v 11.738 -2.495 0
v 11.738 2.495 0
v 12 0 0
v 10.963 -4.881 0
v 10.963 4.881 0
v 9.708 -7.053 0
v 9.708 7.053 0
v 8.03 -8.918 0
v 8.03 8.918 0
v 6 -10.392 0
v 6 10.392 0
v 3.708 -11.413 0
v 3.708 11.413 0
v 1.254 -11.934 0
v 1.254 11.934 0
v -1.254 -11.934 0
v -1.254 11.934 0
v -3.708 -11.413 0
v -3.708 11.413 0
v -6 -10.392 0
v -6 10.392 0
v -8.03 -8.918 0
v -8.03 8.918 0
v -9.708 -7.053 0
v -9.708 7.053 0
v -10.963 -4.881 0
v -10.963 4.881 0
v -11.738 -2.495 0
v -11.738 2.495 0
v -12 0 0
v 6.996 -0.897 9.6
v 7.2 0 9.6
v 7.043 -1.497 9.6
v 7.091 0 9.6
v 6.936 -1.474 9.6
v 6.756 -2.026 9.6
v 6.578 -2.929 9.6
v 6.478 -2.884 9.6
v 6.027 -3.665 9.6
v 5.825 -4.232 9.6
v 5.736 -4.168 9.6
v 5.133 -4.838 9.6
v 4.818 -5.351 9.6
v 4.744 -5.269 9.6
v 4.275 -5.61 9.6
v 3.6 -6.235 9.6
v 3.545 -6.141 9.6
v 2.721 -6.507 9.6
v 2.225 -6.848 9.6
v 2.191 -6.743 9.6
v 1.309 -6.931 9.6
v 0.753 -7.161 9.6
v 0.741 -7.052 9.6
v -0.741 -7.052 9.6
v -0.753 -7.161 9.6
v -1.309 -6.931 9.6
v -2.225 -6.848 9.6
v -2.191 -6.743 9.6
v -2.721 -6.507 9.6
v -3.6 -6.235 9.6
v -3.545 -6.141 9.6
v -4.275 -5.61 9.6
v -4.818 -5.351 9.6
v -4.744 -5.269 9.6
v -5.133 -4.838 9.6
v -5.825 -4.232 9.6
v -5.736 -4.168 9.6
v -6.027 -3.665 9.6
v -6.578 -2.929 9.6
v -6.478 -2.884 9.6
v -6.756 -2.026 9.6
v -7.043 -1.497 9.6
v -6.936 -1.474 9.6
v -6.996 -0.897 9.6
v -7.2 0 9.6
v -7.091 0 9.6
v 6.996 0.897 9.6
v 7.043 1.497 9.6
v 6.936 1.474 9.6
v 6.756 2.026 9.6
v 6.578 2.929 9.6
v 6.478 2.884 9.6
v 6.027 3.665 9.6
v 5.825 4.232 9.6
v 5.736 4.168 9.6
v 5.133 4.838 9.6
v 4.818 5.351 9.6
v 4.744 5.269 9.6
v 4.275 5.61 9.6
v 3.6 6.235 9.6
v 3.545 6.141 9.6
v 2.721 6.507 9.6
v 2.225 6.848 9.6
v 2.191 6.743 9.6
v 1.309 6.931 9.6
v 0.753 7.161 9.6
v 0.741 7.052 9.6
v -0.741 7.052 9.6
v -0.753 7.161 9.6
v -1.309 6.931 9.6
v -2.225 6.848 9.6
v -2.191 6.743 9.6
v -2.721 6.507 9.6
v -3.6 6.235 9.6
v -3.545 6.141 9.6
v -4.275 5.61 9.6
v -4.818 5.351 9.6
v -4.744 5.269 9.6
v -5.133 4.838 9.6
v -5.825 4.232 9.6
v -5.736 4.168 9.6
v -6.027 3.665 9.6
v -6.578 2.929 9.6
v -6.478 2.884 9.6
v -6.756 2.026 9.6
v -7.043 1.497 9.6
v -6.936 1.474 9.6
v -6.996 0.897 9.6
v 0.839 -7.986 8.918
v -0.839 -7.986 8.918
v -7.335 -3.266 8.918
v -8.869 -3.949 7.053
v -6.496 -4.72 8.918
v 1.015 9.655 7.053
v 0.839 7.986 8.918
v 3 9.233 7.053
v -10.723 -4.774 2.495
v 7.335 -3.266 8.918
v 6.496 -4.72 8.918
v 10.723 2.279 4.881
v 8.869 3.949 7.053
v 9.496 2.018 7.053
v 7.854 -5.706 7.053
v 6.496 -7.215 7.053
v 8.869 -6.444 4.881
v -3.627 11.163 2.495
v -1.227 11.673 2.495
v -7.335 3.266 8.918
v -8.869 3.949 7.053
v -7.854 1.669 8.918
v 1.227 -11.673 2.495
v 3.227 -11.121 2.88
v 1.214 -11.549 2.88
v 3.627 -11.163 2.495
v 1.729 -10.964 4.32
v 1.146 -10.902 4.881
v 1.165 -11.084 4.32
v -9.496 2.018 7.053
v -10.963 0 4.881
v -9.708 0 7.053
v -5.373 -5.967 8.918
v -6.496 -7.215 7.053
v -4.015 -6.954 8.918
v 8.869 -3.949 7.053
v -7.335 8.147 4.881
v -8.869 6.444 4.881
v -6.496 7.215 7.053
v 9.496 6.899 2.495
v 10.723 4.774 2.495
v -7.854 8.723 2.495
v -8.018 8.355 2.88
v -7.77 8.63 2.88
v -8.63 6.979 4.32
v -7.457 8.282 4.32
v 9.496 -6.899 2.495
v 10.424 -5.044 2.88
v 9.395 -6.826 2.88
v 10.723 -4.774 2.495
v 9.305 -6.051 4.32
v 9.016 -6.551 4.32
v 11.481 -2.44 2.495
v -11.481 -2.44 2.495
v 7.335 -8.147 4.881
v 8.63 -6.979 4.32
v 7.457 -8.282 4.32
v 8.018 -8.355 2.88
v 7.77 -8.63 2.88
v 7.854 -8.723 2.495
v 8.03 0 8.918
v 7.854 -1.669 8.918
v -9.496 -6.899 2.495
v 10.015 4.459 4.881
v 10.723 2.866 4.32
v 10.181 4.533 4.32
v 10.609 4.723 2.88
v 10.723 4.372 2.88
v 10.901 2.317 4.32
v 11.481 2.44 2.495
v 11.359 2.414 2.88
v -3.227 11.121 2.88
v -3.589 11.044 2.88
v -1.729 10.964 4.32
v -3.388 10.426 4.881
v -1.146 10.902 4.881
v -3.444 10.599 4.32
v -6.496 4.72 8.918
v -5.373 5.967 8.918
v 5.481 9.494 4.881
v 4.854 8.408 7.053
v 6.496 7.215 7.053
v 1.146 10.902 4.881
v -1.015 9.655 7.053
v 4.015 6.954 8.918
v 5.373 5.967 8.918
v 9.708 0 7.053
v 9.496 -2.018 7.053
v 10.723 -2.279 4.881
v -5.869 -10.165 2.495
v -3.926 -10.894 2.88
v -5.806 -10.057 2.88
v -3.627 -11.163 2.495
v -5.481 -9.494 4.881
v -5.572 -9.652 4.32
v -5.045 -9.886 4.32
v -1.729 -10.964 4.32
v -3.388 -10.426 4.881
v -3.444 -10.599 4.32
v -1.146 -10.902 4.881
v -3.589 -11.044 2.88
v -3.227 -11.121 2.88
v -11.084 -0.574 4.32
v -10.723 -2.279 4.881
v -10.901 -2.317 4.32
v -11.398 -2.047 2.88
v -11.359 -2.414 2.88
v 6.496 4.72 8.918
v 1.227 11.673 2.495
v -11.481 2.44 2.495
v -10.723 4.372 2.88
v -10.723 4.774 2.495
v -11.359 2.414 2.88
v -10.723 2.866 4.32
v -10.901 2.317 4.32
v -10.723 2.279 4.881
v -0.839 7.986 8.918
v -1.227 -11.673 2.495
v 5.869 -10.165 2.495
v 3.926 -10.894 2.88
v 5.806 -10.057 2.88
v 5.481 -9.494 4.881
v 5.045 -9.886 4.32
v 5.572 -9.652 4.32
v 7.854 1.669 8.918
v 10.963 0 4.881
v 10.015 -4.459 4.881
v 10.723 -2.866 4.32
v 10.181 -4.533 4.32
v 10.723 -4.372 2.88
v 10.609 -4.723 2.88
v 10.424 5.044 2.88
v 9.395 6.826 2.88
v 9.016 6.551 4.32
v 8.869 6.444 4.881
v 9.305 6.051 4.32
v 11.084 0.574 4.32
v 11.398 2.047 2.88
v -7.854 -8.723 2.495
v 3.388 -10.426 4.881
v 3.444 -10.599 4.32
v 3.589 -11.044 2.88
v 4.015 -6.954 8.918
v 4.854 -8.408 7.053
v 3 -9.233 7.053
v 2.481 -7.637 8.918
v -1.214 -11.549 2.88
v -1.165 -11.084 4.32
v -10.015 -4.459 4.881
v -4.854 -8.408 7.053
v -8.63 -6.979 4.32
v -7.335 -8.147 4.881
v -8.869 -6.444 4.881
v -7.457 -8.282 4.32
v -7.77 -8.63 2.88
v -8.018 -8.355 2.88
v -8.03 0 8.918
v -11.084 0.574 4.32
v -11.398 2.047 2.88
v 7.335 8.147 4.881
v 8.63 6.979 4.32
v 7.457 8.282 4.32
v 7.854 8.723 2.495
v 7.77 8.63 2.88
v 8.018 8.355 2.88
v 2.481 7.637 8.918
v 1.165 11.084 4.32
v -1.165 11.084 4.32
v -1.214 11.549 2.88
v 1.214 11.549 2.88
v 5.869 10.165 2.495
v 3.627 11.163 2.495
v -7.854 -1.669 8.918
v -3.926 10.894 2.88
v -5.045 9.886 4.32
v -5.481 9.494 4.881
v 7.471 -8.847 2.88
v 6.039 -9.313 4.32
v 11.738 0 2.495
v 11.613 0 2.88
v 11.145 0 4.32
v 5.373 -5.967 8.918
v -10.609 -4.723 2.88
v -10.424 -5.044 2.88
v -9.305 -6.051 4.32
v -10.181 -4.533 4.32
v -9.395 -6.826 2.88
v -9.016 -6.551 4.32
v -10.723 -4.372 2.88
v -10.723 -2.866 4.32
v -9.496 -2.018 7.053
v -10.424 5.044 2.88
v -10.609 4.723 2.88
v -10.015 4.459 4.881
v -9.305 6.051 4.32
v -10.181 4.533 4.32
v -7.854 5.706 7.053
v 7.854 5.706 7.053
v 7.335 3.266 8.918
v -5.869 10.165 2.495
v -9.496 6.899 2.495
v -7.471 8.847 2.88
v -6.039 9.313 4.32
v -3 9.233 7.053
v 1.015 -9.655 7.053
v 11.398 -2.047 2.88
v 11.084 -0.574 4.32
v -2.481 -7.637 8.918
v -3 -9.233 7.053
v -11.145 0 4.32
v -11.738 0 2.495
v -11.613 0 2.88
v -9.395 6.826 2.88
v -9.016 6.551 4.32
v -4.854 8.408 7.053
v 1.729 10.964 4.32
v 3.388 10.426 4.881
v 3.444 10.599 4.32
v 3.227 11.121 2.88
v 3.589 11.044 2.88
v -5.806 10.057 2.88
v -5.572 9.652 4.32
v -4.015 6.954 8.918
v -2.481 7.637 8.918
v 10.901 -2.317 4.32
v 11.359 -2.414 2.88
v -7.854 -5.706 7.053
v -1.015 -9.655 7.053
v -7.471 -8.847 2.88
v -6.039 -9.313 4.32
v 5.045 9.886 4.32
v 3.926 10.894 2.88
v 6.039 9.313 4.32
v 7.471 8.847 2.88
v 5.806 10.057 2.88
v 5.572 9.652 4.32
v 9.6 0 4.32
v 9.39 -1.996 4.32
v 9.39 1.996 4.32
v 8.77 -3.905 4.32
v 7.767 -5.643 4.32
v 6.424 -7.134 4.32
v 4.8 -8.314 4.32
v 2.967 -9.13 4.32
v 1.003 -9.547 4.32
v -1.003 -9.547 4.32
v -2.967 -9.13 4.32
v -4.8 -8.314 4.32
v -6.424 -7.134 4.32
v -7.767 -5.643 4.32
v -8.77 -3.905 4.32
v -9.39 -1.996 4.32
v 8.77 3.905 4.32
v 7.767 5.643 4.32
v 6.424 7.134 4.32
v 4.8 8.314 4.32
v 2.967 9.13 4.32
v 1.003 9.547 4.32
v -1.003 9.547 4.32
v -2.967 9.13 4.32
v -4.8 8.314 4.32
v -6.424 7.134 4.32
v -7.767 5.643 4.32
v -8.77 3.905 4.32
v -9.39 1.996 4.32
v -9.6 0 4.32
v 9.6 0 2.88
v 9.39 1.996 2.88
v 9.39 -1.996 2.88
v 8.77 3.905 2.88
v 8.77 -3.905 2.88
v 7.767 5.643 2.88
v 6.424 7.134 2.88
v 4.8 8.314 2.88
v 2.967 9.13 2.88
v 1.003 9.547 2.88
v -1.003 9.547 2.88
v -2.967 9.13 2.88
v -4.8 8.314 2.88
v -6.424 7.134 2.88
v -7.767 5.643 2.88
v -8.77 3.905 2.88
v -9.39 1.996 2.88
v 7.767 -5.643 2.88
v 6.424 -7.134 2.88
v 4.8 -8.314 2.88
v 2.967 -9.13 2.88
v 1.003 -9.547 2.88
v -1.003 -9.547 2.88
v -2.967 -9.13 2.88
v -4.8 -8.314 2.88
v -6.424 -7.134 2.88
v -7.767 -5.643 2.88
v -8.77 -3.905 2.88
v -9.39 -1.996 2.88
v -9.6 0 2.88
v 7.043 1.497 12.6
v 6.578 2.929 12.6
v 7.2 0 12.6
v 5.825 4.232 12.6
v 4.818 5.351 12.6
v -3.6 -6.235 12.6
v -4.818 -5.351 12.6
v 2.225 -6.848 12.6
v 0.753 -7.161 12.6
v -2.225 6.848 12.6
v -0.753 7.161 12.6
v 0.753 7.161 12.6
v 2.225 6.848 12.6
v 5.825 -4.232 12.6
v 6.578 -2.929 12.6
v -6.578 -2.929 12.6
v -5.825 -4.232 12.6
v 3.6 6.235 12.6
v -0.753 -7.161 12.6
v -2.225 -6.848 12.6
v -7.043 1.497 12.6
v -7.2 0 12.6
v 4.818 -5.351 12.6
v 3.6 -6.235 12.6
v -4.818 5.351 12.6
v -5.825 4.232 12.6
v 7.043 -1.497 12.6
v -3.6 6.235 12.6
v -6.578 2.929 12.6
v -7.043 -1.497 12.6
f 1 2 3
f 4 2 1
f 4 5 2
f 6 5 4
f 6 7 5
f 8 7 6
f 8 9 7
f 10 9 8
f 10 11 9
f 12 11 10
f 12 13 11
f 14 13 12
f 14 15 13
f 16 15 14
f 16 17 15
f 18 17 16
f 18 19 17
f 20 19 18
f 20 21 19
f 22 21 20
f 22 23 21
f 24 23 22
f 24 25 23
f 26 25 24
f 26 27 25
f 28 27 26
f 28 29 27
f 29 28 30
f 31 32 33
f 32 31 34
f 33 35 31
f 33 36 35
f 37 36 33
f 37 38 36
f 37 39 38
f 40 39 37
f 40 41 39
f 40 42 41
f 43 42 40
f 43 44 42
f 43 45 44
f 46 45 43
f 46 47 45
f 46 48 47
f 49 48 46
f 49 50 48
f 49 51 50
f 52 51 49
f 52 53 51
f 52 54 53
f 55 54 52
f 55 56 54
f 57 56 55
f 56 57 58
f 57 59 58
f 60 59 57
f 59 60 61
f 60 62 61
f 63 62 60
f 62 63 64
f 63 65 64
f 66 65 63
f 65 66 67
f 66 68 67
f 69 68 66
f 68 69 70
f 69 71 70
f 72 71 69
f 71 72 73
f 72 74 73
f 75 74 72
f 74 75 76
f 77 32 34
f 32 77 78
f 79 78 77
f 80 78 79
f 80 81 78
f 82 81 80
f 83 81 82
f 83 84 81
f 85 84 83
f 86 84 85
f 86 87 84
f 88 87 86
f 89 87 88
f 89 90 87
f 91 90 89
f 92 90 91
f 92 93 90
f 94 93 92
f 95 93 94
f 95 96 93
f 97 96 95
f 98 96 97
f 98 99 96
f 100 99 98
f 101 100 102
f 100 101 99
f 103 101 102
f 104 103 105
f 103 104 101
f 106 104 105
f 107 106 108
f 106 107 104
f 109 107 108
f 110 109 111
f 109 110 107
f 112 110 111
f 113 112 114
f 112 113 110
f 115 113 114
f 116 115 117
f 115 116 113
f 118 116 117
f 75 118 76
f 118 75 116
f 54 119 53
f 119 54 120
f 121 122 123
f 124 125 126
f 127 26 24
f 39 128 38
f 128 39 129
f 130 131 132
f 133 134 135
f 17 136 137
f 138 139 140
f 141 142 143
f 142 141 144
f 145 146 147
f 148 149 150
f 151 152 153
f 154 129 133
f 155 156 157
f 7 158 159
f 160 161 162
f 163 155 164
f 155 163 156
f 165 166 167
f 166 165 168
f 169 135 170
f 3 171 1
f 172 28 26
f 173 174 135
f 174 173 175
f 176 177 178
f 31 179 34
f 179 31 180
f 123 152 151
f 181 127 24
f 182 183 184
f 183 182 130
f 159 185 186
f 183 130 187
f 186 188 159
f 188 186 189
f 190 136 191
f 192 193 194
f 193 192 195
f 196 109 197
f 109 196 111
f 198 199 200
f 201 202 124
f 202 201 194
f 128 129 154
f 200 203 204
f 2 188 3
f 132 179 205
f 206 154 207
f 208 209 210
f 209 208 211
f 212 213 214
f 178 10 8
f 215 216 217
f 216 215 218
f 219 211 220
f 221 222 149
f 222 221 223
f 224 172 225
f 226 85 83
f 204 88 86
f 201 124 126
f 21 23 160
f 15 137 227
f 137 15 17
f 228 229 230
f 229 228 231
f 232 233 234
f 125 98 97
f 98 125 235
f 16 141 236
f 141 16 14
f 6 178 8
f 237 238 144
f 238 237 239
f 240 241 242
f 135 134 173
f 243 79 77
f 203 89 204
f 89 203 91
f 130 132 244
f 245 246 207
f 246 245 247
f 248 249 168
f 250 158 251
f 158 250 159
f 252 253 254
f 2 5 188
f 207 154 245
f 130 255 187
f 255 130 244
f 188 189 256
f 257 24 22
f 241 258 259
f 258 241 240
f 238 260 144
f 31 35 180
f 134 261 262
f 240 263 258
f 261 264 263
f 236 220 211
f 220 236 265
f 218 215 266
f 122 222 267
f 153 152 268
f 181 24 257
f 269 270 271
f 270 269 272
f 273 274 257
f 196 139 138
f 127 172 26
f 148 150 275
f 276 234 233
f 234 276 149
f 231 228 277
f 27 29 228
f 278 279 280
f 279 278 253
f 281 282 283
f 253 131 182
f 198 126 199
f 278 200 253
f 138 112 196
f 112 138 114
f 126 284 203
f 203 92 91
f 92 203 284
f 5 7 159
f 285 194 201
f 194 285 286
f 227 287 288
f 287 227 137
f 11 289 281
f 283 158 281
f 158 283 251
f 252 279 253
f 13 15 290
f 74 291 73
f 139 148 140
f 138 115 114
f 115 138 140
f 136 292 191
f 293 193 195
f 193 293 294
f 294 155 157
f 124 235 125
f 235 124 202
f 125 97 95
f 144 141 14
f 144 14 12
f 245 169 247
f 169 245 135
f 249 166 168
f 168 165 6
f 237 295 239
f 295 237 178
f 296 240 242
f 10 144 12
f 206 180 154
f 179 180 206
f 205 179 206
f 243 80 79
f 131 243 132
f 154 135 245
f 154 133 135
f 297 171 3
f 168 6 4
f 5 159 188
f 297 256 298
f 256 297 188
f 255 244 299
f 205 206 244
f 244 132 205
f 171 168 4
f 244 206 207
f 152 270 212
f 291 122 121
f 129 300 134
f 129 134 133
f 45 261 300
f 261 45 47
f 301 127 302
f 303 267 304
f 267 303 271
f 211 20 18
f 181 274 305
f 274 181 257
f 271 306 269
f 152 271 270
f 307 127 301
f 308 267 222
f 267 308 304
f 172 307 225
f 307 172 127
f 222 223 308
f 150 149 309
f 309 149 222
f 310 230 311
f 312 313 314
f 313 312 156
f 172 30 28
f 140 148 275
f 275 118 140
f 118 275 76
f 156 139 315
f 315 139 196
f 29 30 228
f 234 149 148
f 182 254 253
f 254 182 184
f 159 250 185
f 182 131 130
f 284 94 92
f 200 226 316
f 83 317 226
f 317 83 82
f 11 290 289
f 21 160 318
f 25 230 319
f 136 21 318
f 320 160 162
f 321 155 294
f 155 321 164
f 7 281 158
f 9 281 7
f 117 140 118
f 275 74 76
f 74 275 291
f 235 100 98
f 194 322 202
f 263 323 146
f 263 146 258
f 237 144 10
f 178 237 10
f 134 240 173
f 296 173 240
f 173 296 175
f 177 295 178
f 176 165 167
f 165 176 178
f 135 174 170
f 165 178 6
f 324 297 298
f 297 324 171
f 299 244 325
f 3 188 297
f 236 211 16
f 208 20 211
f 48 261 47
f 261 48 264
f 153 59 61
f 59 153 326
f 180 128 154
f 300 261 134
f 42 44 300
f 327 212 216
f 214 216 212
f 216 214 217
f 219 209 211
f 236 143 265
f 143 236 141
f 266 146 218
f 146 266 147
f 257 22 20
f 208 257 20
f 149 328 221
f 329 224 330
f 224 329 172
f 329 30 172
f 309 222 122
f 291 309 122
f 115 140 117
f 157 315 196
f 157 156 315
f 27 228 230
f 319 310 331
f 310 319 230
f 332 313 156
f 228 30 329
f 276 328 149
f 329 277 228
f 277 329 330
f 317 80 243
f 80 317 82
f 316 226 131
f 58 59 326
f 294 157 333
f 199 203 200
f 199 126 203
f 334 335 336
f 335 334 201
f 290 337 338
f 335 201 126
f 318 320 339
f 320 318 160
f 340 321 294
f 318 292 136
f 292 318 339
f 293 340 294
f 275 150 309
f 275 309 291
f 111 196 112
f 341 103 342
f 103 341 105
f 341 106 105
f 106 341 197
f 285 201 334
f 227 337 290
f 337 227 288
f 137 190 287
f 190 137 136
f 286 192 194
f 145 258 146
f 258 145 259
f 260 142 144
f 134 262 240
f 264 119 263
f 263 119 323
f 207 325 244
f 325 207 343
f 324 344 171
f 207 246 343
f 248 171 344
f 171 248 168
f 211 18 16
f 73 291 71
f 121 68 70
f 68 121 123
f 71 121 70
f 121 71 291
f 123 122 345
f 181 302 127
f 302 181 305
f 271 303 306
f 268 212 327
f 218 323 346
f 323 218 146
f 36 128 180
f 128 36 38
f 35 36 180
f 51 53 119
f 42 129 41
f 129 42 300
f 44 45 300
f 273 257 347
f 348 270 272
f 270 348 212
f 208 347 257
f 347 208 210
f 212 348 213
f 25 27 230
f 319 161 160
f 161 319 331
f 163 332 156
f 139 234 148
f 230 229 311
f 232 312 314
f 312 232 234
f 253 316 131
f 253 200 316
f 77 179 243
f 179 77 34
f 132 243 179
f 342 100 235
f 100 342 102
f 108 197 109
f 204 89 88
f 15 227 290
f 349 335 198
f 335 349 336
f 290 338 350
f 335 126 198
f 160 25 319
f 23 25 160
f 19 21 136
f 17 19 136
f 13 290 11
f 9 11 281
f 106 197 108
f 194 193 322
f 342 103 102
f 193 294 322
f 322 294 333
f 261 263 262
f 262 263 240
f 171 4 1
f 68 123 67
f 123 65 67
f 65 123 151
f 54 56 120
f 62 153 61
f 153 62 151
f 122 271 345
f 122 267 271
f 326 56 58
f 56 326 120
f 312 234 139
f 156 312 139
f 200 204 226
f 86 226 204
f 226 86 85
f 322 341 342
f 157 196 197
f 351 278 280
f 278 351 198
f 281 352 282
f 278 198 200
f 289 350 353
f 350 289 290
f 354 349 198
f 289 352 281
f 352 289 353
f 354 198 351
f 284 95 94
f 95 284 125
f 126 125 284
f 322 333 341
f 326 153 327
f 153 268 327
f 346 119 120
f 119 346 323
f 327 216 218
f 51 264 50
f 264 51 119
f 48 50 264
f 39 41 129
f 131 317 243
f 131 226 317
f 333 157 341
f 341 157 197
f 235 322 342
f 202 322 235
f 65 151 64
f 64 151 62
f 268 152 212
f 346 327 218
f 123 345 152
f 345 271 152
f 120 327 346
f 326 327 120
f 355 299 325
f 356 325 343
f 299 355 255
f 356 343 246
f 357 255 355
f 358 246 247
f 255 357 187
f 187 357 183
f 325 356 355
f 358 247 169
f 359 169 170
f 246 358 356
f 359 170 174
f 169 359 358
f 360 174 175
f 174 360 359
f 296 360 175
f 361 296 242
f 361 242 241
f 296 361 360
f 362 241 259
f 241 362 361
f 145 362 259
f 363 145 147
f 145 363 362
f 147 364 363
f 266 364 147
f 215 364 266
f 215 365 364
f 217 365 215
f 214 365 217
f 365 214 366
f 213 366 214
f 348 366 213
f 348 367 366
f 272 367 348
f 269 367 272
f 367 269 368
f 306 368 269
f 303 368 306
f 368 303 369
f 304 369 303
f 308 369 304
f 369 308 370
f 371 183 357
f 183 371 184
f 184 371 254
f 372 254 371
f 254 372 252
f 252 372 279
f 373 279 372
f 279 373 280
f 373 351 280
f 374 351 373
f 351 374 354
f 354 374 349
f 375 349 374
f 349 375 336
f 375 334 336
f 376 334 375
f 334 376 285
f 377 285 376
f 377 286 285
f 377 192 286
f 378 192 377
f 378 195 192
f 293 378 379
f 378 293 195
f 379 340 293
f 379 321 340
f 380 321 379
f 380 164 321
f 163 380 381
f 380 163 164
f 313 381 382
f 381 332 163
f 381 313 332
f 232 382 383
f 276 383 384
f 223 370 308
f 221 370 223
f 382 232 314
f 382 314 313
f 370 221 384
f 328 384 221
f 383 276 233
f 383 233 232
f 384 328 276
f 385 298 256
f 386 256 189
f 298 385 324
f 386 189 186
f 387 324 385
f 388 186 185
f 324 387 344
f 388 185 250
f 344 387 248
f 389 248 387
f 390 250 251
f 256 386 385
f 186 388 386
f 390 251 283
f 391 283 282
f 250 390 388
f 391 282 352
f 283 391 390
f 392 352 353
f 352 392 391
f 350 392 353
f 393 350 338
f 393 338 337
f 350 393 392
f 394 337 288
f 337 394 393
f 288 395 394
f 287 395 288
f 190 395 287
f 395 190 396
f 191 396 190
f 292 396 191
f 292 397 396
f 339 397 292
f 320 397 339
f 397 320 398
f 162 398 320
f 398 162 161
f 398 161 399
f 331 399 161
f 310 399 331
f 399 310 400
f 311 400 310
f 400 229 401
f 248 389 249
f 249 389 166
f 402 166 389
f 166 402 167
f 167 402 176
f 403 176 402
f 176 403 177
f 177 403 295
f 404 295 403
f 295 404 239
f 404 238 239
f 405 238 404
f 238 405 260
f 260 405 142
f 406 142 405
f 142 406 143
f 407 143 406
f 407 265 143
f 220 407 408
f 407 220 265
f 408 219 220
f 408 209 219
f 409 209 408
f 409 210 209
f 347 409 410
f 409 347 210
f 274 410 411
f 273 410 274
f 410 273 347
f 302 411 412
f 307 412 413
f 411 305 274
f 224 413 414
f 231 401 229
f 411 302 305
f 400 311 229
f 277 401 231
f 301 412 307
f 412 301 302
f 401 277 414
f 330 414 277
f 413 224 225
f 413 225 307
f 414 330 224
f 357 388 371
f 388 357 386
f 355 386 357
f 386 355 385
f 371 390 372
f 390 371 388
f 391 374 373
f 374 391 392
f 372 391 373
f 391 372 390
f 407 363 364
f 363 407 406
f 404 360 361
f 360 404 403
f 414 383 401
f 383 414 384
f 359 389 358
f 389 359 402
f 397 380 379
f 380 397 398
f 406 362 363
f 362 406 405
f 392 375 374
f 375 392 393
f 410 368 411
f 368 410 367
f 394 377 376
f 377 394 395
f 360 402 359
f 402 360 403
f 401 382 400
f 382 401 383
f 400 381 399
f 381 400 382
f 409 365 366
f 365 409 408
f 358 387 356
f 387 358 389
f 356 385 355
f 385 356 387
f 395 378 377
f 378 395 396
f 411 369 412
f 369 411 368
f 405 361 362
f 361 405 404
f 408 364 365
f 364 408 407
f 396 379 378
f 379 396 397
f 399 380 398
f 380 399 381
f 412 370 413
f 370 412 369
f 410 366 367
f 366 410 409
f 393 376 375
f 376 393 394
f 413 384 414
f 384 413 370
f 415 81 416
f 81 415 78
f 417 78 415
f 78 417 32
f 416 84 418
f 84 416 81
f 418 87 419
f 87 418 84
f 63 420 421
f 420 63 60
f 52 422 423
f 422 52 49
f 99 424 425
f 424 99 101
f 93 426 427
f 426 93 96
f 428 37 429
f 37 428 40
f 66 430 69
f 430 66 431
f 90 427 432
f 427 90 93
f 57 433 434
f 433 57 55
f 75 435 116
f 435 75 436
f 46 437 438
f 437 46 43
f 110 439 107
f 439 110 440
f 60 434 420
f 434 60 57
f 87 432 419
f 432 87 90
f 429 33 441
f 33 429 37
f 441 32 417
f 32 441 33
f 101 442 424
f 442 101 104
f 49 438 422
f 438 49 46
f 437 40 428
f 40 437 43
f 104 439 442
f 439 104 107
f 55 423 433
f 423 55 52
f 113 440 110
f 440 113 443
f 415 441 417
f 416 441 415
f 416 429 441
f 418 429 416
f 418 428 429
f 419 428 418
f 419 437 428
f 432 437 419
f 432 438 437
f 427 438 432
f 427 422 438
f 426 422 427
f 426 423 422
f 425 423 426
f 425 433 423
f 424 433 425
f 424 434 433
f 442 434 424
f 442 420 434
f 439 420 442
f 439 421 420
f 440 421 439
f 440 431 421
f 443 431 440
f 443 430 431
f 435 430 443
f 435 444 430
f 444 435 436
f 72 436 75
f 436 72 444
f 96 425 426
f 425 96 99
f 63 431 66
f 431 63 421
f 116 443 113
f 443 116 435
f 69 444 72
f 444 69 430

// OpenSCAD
// file: parts.scad
/* Basic elementary shapes and negative space */

module ring(height, inner_radius, outer_radius) {
  difference() {
    cylinder(height, outer_radius, outer_radius);
    cylinder(height, inner_radius, inner_radius);
  }
} 
// ring(10, 8, 12);
 
module countersunk_ring(height, countersink_radii, outer_radius) {
  difference() {
    cylinder(height, outer_radius, outer_radius);
    cylinder(height, countersink_radii[0], countersink_radii[1]);
  }
 
}

module groove(height, inner_radius, offset) {
  difference() {
    child(0);
    translate([0, 0, offset]) {
      ring(height, inner_radius, 2 * inner_radius);
    }
  }
}
// groove(3, 5, 5) cylinder(10, 6, 6);

module toytop(height, radius) {
  cylinder(height / 2, radius, 0);
  translate([0, 0, -height / 2]) cylinder(height / 2, 0, radius);
}

module saucer(height, radius, inner_radius) {
  slice_height = height_of_cone_slice(radius, height / 2, inner_radius);

  difference() {
    toytop(height, radius);
    for (i = [0 : 1]) {
      mirror([0, 0, i]) 
        translate([0, 0, slice_height]) 
          cylinder(height, inner_radius, inner_radius);
    }
  }
}
// saucer(8, 10, 5);

module teardrop(head_ratio, radius) {
  theta = asin(head_ratio);
  r = radius * cos(theta);
  h = r * tan(90 - theta);

  sphere(radius);
  translate([0, 0, radius * head_ratio]) {
    cylinder(h, r, 0);
    translate([0, 0, 1.1 * h]) child(0);
  }
}
// teardrop(0.5, 10);

/* Building parts for chess pieces */
module base(height = 5, radius) {
  indent_height = 3;
  indent_ratio = 0.6;
  indent_groove = height * 0.4;
  indent_offset = height * 0.6;

  groove(height * 0.15, radius * 0.8, height * 0.3) {
    intersection() {
      cylinder(h = height, r = radius);
      sphere(radius);
    }
  }
}
// base(10, 10);

module neck(height, radius) {
  union() {
    cylinder(height * 0.2, radius, radius * 0.8);
    cylinder(height, radius * 0.6, radius * 0.8 * 0.6);
  }
}
// neck(20, 10);

module double_collar(neck_radius) {
  toytop(neck_radius, neck_radius);
  translate([0, 0, neck_radius * 0.5]) {
    toytop(10, neck_radius * 0.8);
    translate([0, 0, neck_radius]) { 
      for (i = [0 : $children - 1]) {
        child(i);
      }
    }
  }
}
// double_collar(10);

module piece_body(base_radius) {
  base_height = 0.8 * base_radius;

  union() {
    base(base_height, base_radius);

    translate([0, 0, base_height]) { 
      for (i = [0 : $children - 1]) {
        child(i);
      }
    }
  }
}
// piece_body(10);

/* calculates the radius of a circle cross-section if we took a slice of a sphere
 * height has to be less than radius 
 */
function radius_of_sphere_slice(radius, slice_height) = 
  radius * cos(asin(slice_height / radius));

/* calculate the height from midpoint of circle cross-section if we took a slice of 
 * a sphere */
function height_of_sphere_slice(radius, slice_radius) = 
  radius * sin(acos(slice_radius / radius));

/* calculates the radius of a perpendicular slice of a cone given the slice height */
function radius_of_cone_slice(radius, cone_height, slice_height) = 
  radius * (1 - slice_height / cone_height);

/* calculates the height of a perpendicular slice of a cone given the slice radius */
function height_of_cone_slice(radius, cone_height, slice_radius) = 
  cone_height * (1 - slice_radius / radius);
// main file
use <parts.scad>

$fn=30;

module knight_profile() {
  rotate([90, 0, 0])
    translate([-7, 0, 0])
      linear_extrude(height = 10, convexity = 10, center = true)
        import("knight_profile.dxf");
}

// every 15px in inkscape is 4 units in openscad
module knight_face() {
  rotate([110, 0, 90])
    translate([-4.1, 0, 0])
      linear_extrude(height = 25, convexity = 10, center = true)
        import("knight_face.dxf");
}

// specialized module to angularlize the horse's face
module angle_face() {
  translate([0, 0, 9])
    rotate([0, 15, 0])
      translate([0, 0, -9.5])
        child(0);
}

module knight_head(radius, ratio = 1.8) {
  neck_countersink_ratio = 1.6 / 1.8 * ratio;
  neck_mid_height = ratio * 100 / 18;
  height = ratio * 16;

  difference() {
    scale(ratio) {
      intersection() {
        knight_profile();
        angle_face() knight_face();
      }
    }

    // countersunk ring to fit the horse on the base
    countersunk_ring(neck_mid_height, 
                     [radius, neck_countersink_ratio * radius], 
                     ratio * radius);
  }
}

module Knight(base_radius = 12) {
  base_height = base_radius * 4 / 5;
  neck_radius = radius_of_sphere_slice(base_radius, base_height);
  neck_height = 4;

  piece_body(base_radius) {
    cylinder(base_radius / 4, neck_radius, neck_radius); // glue
    knight_head(neck_radius);
  }
}

Knight();
